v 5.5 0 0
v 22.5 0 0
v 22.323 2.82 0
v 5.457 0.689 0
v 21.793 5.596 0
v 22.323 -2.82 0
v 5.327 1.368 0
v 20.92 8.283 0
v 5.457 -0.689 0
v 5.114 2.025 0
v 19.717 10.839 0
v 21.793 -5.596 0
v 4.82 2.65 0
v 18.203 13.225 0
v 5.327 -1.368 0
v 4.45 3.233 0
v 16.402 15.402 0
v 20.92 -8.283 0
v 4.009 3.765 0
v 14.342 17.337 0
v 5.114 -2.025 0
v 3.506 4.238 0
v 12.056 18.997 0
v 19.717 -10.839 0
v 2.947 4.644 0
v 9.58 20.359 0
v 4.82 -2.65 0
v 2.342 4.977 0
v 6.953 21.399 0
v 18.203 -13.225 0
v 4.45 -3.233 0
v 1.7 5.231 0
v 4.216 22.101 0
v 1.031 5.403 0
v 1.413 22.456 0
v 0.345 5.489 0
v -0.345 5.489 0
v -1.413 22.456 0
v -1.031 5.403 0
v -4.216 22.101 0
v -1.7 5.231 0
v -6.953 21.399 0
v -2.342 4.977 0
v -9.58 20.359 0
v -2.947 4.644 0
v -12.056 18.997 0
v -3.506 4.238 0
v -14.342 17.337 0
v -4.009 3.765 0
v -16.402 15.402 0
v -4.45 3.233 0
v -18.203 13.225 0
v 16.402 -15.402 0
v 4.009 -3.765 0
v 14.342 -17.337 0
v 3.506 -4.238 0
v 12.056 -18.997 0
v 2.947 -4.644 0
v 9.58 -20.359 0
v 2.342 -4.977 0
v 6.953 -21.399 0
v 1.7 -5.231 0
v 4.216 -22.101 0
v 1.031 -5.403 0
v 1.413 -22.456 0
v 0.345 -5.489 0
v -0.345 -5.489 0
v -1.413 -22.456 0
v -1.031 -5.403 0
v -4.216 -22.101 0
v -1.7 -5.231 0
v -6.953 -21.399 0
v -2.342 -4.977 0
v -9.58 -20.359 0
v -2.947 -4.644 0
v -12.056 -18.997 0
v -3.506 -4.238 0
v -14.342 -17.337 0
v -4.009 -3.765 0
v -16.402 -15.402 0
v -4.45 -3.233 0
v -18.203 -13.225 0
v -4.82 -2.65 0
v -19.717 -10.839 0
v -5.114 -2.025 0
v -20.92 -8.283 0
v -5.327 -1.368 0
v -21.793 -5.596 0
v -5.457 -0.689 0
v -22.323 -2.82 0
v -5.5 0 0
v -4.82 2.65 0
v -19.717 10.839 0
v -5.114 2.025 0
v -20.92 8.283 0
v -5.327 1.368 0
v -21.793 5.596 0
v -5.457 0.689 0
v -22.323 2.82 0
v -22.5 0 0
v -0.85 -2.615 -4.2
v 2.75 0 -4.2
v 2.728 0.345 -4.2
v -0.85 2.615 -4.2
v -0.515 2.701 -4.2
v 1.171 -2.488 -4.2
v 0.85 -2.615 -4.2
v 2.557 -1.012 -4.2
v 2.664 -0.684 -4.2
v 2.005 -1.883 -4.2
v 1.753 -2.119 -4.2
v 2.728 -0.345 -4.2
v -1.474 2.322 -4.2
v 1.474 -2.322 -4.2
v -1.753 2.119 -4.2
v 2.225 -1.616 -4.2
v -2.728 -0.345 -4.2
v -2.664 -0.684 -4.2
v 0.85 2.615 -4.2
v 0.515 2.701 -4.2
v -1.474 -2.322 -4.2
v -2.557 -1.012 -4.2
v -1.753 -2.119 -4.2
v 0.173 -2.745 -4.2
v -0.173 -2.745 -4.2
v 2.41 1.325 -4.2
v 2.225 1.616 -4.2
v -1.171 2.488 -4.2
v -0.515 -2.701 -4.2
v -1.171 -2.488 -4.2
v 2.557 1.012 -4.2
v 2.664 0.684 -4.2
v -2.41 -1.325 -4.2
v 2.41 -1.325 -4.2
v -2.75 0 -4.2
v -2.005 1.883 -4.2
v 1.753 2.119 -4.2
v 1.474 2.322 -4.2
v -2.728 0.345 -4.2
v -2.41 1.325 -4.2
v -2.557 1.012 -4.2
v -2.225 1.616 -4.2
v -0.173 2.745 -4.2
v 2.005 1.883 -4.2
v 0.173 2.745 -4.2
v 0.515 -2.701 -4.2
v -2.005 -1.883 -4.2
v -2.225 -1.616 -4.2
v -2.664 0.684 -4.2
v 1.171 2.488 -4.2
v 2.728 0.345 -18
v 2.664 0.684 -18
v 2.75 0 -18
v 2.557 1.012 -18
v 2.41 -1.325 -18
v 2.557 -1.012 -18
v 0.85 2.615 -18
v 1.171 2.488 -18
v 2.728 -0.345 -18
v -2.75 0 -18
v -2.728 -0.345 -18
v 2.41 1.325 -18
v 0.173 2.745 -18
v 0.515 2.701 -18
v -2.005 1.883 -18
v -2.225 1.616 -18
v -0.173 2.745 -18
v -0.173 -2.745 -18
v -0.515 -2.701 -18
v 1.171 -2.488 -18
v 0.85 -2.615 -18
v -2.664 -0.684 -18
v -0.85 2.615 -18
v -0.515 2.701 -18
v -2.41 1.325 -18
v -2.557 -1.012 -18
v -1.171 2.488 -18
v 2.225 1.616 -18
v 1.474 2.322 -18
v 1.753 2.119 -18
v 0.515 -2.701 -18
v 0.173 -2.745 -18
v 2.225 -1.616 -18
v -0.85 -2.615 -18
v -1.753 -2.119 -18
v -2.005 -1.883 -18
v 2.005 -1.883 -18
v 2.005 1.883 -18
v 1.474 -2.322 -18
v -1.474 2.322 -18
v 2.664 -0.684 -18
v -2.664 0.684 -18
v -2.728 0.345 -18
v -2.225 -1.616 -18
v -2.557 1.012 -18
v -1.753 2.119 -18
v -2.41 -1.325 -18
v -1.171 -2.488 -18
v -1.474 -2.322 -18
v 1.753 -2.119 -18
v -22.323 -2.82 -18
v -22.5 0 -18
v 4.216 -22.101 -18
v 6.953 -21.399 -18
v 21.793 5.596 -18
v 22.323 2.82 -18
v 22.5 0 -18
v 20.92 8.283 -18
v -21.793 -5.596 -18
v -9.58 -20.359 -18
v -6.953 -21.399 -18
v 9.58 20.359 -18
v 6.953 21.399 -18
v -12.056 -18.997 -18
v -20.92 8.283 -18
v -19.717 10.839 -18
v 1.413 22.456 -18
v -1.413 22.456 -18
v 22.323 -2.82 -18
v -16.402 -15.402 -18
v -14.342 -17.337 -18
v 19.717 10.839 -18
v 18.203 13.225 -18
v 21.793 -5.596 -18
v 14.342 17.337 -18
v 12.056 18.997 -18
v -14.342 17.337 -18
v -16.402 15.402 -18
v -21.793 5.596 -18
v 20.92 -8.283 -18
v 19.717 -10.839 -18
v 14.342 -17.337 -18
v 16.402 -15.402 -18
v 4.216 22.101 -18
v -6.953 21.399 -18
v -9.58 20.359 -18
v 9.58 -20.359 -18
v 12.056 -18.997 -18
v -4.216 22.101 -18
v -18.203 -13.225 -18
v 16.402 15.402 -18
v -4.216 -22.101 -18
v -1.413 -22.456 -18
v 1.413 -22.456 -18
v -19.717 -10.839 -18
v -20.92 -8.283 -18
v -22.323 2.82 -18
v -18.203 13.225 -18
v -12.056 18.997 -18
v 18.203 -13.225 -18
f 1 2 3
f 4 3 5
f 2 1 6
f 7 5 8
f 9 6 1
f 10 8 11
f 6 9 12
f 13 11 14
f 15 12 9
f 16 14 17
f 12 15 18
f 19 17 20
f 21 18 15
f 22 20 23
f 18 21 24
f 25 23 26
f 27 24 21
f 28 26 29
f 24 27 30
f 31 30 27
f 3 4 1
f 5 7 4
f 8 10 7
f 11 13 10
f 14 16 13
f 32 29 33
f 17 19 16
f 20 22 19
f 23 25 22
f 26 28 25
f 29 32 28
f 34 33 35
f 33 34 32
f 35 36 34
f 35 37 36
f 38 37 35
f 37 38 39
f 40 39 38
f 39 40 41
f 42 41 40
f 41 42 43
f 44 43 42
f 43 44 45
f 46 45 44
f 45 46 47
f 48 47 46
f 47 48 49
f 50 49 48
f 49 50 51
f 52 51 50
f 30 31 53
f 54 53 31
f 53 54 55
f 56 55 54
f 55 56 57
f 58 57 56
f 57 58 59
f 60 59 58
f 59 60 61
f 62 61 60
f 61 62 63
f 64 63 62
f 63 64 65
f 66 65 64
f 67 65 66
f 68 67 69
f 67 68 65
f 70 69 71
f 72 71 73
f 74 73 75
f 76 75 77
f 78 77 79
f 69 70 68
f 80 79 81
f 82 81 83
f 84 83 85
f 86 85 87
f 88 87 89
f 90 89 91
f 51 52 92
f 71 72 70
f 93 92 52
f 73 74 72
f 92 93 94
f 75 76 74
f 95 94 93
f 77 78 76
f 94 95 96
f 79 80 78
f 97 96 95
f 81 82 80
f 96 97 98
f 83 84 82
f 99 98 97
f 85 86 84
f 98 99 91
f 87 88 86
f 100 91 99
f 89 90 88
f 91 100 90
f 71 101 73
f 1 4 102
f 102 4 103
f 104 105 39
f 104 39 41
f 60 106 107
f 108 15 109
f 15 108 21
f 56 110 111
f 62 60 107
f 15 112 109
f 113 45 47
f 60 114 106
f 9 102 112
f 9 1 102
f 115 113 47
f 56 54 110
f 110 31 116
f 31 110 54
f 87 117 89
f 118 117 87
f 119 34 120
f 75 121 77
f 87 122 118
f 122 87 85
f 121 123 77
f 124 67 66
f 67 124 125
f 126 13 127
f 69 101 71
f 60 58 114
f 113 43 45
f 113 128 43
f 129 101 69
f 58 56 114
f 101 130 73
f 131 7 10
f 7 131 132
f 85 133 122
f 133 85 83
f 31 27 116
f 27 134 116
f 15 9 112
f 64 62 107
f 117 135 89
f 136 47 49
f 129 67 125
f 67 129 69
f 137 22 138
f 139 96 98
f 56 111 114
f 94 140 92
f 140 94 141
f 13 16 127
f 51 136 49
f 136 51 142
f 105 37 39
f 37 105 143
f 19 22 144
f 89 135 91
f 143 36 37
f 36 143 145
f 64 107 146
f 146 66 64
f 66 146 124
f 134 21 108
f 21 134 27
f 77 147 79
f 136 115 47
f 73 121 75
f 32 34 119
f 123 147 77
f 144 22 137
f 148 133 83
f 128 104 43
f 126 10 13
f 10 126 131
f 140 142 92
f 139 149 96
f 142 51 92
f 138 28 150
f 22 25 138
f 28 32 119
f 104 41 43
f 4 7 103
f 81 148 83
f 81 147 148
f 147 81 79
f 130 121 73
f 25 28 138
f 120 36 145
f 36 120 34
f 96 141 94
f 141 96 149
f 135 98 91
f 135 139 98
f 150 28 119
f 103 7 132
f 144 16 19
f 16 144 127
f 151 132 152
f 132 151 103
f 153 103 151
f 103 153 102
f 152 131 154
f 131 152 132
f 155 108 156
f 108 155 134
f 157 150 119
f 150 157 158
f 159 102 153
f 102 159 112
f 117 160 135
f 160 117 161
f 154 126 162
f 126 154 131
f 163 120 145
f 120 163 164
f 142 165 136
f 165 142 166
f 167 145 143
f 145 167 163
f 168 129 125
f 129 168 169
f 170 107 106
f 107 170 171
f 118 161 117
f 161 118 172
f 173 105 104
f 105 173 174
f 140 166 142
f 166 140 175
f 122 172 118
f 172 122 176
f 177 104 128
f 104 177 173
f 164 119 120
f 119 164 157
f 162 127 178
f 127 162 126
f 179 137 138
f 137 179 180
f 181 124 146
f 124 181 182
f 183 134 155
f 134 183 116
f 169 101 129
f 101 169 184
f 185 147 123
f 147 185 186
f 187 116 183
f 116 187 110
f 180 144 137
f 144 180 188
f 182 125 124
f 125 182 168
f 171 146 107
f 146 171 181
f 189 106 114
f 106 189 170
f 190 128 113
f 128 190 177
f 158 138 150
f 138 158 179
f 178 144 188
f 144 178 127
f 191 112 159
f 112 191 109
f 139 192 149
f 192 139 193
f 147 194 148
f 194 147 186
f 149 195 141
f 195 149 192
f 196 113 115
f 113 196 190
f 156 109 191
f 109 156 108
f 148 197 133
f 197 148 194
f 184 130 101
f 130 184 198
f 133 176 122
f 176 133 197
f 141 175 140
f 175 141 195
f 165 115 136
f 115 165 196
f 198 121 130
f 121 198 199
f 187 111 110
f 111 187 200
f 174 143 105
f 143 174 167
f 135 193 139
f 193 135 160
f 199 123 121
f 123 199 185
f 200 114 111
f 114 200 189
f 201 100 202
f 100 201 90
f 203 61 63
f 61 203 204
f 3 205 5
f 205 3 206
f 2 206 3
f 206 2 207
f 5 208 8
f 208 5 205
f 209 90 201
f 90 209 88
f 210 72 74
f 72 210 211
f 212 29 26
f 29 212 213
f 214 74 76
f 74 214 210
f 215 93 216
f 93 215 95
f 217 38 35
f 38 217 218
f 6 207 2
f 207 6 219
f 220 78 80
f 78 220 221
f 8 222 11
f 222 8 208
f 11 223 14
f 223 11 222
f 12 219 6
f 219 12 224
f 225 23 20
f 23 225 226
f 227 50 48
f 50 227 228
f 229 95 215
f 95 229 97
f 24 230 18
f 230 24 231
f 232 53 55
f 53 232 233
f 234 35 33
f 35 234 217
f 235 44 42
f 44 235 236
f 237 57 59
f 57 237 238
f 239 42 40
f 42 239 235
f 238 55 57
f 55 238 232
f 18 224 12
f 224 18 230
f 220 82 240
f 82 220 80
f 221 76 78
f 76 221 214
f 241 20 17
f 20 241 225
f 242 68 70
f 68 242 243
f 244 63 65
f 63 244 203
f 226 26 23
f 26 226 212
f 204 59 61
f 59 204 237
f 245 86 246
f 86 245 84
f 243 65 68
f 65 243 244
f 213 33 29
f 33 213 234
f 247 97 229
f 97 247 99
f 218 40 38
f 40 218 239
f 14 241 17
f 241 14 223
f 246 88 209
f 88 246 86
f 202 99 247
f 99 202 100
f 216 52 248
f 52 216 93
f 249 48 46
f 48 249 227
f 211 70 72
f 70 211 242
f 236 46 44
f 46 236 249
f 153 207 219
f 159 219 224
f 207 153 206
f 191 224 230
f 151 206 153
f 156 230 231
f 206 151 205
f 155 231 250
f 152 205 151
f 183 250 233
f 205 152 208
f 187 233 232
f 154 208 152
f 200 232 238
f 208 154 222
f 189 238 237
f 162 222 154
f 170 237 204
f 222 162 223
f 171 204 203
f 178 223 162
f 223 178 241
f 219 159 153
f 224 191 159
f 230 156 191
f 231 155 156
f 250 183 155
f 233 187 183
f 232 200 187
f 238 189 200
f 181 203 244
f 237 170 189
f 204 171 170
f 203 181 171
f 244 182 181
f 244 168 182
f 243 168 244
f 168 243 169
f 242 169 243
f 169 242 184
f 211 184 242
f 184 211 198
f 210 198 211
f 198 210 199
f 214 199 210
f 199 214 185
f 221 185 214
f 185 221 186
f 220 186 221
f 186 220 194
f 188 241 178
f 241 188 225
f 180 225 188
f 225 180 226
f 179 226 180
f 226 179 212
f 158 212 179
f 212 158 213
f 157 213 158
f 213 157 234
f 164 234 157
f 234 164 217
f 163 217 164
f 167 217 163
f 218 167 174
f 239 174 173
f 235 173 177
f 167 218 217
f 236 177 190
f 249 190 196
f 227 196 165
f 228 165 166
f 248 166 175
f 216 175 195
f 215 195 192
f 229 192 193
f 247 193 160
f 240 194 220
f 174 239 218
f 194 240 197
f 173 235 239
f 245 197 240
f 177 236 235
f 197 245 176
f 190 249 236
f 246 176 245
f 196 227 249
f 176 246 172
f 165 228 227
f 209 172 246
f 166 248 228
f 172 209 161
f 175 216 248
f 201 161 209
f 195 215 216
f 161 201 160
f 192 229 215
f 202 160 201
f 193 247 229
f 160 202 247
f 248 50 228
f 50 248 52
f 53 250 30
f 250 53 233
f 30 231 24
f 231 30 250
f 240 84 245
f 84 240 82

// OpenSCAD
$fn = 50;


difference() {
	union() {
		translate(v = [0, 0, -18.0000000000]) {
			cylinder(h = 18, r = 22.5000000000);
		}
	}
	union() {
		translate(v = [0, 0, 0]) {
			rotate(a = [0, 0, 0]) {
				difference() {
					union() {
						translate(v = [0, 0, -21.0000000000]) {
							cylinder(h = 21, r = 2.2500000000);
						}
						translate(v = [0, 0, -4.2000000000]) {
							cylinder(h = 4.2000000000, r1 = 2.7500000000, r2 = 5.5000000000);
						}
						translate(v = [0, 0, -21.0000000000]) {
							cylinder(h = 21, r = 2.7500000000);
						}
						translate(v = [0, 0, -21.0000000000]) {
							cylinder(h = 21, r = 2.2500000000);
						}
					}
					union();
				}
			}
		}
	}
}
